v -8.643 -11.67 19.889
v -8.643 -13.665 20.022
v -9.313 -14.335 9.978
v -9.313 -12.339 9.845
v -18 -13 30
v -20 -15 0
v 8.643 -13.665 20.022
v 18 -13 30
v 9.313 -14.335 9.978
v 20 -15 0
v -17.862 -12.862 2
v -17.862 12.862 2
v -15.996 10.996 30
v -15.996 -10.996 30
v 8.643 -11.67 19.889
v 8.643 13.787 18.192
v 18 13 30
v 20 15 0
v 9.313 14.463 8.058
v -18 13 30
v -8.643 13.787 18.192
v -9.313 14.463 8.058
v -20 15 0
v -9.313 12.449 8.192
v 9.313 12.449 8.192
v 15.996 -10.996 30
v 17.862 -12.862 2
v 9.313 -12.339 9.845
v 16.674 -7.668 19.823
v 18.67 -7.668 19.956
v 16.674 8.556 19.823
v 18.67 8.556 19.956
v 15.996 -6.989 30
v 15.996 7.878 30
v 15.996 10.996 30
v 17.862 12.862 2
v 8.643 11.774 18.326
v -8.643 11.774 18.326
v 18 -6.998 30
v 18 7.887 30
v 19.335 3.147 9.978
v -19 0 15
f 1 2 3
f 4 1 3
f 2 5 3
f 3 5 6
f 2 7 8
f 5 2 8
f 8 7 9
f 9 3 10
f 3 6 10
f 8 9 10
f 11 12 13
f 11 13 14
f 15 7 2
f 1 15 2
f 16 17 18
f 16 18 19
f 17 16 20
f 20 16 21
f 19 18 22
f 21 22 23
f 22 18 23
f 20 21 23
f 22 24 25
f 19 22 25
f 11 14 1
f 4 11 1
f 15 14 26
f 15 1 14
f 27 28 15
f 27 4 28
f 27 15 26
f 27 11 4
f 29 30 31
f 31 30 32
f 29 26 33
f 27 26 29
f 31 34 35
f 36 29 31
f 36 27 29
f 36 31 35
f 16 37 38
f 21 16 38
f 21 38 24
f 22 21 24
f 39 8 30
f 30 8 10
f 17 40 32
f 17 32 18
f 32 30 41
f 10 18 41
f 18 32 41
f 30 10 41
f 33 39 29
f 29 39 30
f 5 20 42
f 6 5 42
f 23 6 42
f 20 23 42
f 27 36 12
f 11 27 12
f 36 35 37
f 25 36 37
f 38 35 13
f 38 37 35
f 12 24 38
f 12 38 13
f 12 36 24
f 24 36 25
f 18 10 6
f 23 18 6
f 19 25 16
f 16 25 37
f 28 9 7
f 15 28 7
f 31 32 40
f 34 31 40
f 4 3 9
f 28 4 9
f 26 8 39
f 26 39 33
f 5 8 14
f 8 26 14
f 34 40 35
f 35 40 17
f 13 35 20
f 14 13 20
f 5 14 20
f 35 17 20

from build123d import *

# Parameters (mm, degrees)
SHELL_1_T           = -2
CUT_EXTRUDE_1_DEPTH = 47.230712485
CUT_EXTRUDE_4_DEPTH = 10


with BuildPart() as part:
    # 草图2 → 放样1 section 0
    with BuildSketch(Plane.XY.offset(30)):
        with BuildLine():
            Line((18, -13), (18, 13))
            Line((18, 13), (-18, 13))
            Line((-18, 13), (-18, -13))
            Line((-18, -13), (18, -13))
        make_face()
    # 草图1 → 放样1 section 1
    with BuildSketch(Plane.XY):
        with BuildLine():
            Line((-20, 15), (20, 15))
            Line((20, 15), (20, -15))
            Line((20, -15), (-20, -15))
            Line((-20, -15), (-20, 15))
        make_face()
    loft()

    # 抽壳1
    shell_1_openings = [part.faces().sort_by_distance(p)[0] for p in [
        (0, 0, 30),
    ]]
    offset(amount=SHELL_1_T, openings=shell_1_openings, kind=Kind.INTERSECTION)

    # 草图3 → 切除-拉伸1 (cut, through all)
    with BuildSketch(Plane(origin=(0, -14.933628319, 0.995575221), x_dir=(1, 0, 0), z_dir=(0, -0.997785157856609, 0.06651901052377396))):
        Polygon((9.31271042, 9.002214842), (8.643090631, 19.068807599), (-8.643090631, 19.068807599), (-9.31271042, 9.002214842), align=None)
    extrude(amount=-CUT_EXTRUDE_1_DEPTH, mode=Mode.SUBTRACT)

    # 草图4 → 切除-拉伸4 (cut)
    with BuildSketch(Plane(origin=(19.911504425, 0, 1.327433628), x_dir=(0.066519010523774, 0, -0.997785157856609), z_dir=(0.997785157856609, 0, 0.066519010523774))):
        Polygon((-31.240874648, -6.83151887), (-18.66961979, -7.667746304), (-18.66961979, 8.556289454), (-31.240874648, 7.720062019), align=None)
    extrude(amount=-CUT_EXTRUDE_4_DEPTH, mode=Mode.SUBTRACT)


solid = part.part
